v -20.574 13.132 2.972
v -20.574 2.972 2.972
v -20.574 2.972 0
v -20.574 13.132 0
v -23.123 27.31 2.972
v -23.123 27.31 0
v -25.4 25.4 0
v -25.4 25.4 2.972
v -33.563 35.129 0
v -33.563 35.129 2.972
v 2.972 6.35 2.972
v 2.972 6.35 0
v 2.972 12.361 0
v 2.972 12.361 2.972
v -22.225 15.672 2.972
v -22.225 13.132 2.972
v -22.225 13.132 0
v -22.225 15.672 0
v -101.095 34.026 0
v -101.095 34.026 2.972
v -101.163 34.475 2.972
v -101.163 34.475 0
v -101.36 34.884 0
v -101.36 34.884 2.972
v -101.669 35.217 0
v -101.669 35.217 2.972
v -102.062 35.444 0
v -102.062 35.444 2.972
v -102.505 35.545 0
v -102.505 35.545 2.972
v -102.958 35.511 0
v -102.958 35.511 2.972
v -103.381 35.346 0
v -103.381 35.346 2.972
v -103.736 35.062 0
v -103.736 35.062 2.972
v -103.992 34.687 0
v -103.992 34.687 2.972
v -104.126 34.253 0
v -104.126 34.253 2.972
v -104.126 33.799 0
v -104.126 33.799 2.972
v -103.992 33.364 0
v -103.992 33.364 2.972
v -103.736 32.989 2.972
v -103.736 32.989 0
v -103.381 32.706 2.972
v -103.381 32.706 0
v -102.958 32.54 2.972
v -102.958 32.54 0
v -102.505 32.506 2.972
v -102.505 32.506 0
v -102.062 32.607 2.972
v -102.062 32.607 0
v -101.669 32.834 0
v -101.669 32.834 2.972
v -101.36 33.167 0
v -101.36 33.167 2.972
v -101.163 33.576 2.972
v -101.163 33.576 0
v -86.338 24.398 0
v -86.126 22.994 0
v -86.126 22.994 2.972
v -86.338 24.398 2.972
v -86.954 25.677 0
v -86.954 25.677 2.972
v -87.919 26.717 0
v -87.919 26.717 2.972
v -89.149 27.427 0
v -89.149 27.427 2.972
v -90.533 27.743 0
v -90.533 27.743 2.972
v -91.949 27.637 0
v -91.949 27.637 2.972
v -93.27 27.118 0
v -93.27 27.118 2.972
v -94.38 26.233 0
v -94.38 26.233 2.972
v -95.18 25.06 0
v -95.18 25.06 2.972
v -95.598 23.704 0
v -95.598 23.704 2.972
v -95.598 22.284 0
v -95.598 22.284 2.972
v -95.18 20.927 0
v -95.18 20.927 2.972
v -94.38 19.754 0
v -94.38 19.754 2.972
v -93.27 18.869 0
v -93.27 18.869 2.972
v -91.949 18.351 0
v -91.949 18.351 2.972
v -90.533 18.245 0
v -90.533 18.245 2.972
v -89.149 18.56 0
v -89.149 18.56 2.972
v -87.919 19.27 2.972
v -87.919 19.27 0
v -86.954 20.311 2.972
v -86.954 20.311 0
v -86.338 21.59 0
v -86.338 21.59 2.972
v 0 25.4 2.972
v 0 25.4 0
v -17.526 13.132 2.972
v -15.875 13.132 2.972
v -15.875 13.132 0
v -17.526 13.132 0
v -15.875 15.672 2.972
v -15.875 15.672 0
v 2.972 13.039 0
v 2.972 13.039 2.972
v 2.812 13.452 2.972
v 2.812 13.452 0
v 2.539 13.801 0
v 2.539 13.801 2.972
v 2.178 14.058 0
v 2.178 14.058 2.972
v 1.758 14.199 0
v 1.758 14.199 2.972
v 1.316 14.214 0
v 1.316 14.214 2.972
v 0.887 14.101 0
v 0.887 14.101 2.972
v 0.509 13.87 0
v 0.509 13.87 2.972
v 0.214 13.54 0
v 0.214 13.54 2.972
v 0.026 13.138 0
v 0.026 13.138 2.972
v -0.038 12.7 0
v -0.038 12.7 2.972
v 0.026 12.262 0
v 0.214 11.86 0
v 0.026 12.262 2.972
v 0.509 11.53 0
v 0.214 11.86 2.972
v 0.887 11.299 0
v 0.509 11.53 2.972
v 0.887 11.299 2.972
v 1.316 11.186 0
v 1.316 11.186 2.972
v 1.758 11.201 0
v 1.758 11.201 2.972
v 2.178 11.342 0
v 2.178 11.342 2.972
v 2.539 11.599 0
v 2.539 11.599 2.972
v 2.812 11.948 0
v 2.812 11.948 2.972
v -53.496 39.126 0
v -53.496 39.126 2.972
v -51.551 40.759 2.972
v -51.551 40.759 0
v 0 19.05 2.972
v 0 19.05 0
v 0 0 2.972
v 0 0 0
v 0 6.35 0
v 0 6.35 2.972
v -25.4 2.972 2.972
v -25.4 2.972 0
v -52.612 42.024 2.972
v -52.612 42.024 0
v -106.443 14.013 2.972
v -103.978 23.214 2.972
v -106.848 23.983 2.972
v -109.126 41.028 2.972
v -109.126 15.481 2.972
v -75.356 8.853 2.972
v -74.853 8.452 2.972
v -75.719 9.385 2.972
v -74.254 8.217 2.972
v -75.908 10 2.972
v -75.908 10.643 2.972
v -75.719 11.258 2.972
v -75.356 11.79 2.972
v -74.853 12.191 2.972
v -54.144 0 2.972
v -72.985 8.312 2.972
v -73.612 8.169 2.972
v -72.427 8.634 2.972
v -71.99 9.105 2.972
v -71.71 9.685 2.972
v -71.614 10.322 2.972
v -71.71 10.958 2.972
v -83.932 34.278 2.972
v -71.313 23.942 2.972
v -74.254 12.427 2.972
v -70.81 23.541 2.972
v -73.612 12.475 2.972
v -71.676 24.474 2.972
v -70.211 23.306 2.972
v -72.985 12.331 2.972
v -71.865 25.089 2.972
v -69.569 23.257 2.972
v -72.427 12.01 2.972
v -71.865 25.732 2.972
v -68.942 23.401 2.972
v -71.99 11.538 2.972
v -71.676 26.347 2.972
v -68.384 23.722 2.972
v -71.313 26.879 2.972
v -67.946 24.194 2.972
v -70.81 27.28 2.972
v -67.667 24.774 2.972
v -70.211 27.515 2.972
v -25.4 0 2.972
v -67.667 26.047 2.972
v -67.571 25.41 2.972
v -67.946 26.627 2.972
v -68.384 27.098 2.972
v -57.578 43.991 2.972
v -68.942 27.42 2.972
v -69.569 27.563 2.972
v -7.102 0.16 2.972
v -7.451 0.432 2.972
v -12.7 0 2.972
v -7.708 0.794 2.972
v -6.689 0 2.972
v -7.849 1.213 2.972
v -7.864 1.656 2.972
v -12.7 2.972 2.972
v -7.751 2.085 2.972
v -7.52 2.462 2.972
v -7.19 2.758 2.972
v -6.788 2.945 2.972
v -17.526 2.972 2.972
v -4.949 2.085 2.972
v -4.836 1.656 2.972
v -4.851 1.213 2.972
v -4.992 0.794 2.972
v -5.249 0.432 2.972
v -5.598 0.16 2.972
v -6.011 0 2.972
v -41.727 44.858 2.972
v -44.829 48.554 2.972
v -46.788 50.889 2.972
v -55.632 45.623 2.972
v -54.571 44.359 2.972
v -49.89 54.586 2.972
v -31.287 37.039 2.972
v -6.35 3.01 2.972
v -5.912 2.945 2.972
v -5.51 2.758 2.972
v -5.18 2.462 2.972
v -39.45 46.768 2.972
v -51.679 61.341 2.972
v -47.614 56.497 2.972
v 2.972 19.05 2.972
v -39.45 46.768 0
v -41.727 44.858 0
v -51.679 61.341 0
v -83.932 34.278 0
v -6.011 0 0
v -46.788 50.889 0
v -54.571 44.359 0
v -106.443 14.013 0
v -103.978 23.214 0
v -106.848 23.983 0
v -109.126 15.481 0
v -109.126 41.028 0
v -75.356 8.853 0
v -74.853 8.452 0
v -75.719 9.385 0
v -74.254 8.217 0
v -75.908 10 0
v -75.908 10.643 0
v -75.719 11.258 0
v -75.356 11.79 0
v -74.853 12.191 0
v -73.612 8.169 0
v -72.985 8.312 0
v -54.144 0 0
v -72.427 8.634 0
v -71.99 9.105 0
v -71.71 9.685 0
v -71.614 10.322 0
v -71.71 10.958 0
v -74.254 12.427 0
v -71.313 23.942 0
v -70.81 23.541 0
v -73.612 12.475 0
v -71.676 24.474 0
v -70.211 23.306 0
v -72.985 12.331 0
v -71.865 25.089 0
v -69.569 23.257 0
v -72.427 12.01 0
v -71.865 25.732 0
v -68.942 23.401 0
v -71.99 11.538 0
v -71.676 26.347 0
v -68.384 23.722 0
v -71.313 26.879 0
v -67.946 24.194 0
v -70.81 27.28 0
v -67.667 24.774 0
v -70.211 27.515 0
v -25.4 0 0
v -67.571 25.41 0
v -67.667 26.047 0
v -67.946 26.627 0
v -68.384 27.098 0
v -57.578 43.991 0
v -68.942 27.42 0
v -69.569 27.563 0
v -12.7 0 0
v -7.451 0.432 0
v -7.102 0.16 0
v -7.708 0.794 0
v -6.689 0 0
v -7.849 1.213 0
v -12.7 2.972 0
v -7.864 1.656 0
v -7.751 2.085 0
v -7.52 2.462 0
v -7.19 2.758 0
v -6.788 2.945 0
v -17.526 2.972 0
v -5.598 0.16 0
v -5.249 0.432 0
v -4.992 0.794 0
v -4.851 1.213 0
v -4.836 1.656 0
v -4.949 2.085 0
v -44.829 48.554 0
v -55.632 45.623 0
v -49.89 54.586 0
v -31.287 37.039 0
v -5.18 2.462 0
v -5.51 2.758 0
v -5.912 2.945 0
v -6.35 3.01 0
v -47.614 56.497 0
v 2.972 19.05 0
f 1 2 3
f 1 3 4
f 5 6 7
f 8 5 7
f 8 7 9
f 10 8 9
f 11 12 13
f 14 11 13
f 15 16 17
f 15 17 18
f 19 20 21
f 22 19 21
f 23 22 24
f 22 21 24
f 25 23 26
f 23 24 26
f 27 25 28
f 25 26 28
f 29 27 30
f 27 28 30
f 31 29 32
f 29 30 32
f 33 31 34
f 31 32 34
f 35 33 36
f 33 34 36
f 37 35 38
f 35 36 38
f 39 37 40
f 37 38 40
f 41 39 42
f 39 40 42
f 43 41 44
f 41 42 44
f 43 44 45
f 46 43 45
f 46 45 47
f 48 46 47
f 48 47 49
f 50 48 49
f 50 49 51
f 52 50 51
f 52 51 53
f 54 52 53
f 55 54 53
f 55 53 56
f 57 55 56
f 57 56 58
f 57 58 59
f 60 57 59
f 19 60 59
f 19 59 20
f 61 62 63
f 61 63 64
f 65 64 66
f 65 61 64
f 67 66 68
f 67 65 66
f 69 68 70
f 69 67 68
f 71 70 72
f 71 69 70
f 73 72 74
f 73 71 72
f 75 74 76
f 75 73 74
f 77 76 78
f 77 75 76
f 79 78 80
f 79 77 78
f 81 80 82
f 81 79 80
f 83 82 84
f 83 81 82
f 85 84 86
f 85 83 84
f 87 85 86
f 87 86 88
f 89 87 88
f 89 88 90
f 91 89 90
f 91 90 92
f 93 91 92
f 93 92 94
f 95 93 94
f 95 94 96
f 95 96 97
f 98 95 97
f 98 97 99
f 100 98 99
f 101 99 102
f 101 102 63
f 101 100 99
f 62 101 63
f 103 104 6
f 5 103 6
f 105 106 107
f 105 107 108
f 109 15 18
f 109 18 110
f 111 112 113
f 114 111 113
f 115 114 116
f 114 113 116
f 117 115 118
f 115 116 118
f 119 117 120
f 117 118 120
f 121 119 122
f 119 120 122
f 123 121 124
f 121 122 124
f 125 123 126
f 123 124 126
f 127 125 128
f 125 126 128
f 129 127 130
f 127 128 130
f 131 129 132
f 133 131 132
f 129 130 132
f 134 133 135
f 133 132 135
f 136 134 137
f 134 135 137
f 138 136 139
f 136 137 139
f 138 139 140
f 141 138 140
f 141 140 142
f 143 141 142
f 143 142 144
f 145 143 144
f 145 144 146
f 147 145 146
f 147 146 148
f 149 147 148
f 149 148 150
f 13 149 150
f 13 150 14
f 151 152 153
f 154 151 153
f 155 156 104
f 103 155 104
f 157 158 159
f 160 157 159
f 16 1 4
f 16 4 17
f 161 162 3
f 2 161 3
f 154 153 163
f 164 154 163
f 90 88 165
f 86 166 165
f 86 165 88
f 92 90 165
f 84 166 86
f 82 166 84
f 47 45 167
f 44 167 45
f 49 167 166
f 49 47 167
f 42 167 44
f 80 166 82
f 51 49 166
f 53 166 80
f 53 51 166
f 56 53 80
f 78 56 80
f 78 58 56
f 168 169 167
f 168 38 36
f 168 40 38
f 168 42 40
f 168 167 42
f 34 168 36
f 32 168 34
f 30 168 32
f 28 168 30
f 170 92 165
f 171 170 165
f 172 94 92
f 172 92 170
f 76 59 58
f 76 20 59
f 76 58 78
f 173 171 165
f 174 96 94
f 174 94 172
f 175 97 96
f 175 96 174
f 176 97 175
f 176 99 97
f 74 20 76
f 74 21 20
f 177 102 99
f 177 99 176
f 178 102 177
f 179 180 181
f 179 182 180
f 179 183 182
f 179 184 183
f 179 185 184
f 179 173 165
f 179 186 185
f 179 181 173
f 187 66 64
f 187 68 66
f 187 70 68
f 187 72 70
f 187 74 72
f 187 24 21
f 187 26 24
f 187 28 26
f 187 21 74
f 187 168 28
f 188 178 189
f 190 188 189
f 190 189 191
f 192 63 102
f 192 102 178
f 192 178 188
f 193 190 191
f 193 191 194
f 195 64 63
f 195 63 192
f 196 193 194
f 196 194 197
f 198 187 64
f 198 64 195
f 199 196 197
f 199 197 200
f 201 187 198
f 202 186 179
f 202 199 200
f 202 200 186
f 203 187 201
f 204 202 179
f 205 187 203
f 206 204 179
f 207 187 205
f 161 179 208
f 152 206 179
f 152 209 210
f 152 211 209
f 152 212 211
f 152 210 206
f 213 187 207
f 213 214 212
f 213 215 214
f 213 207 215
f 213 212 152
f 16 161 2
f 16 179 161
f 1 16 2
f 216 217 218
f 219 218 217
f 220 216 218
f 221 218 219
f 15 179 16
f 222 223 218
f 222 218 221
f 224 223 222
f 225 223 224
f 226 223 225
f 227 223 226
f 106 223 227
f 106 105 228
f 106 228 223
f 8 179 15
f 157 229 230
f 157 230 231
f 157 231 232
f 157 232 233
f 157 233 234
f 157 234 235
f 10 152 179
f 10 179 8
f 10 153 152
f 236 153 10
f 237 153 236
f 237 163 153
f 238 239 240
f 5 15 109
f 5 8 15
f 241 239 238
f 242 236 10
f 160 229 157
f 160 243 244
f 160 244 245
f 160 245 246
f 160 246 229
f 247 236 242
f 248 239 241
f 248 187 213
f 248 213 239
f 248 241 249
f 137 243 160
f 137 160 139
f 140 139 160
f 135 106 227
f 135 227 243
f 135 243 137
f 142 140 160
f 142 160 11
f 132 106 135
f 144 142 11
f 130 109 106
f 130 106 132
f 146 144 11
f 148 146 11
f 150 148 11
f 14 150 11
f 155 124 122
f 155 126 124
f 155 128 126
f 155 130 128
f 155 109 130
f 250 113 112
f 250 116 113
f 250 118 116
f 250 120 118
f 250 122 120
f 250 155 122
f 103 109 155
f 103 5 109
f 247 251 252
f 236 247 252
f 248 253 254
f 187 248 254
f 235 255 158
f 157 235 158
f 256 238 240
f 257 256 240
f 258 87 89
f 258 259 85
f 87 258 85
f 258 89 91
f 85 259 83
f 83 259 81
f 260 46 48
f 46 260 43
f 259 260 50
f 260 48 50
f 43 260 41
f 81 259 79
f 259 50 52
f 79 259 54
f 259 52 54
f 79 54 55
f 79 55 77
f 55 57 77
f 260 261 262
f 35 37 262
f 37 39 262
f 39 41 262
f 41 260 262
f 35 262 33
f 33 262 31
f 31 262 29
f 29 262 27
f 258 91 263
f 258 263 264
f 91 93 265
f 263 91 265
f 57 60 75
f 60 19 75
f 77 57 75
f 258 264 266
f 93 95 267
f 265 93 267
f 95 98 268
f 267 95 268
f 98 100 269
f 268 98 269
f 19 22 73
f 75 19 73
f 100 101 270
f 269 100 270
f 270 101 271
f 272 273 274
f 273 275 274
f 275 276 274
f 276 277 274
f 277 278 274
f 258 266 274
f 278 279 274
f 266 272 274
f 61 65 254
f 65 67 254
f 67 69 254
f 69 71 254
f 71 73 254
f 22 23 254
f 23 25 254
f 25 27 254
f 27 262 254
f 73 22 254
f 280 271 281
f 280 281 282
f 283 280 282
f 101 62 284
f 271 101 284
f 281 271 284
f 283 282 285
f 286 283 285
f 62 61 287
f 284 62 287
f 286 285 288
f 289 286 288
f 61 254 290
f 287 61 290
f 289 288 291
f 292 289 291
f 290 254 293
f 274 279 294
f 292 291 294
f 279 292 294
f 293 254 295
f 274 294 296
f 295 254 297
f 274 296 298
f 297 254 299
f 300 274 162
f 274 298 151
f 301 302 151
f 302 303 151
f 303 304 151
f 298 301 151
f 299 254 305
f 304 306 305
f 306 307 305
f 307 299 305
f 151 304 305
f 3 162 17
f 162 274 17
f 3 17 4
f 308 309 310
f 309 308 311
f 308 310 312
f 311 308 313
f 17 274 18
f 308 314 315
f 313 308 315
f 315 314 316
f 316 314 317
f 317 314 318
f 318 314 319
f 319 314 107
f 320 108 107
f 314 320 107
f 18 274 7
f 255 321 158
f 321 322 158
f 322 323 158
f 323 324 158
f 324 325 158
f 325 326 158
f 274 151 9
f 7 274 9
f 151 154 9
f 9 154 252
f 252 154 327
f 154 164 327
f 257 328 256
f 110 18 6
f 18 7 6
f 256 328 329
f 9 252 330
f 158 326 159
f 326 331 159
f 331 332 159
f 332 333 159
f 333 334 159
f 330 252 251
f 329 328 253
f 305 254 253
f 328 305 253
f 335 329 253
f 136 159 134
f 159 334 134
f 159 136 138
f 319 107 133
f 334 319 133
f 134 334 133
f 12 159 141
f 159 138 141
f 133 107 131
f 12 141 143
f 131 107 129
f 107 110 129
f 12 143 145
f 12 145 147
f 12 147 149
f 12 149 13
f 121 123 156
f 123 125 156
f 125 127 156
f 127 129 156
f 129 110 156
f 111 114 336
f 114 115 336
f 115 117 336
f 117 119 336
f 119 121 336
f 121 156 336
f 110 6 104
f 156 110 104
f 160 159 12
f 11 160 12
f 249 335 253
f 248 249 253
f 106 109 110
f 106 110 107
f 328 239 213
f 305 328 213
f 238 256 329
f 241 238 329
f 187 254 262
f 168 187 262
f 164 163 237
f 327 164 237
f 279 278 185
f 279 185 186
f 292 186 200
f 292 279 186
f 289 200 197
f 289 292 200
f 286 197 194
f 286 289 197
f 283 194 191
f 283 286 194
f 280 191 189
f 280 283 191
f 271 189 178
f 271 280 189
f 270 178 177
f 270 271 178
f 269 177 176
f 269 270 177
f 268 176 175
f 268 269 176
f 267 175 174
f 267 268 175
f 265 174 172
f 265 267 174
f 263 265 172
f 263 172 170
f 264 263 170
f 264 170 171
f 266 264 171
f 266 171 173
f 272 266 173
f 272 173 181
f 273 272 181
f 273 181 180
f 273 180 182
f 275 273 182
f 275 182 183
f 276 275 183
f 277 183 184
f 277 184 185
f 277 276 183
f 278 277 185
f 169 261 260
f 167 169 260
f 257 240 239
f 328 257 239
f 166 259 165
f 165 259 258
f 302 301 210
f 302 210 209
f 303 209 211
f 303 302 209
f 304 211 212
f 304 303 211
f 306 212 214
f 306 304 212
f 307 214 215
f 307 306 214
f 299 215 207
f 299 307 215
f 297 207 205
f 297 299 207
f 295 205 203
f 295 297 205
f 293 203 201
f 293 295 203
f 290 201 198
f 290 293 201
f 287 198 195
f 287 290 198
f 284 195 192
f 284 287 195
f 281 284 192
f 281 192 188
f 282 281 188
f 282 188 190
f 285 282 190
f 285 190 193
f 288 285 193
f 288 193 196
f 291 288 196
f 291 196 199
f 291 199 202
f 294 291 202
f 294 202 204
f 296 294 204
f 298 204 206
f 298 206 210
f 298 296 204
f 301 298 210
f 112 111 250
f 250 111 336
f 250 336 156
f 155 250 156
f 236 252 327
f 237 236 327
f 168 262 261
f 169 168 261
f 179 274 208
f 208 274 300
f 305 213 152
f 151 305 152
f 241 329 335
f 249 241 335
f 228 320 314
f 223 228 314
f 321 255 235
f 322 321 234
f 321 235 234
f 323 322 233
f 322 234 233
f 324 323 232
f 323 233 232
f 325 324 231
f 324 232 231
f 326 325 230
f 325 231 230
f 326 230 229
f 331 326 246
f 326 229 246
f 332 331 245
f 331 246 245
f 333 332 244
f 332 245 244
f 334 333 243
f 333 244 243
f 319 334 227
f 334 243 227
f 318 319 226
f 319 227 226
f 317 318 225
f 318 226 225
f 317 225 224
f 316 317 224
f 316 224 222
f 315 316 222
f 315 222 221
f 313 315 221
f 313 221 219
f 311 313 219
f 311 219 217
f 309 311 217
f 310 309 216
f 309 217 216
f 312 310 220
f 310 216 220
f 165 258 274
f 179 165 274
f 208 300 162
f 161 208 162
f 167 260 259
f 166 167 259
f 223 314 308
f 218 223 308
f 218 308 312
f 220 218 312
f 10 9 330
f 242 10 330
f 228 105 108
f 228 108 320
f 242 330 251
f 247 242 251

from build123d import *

# Parameters (mm, degrees)
SKETCH1_R           = 2.159
SKETCH1_R_2         = 4.7625
BOSS_EXTRUDE1_DEPTH = 2.9718
SKETCH2_R           = 1.524
CUT_EXTRUDE2_DEPTH  = 3.9718


with BuildPart() as part:
    # Sketch1 → Boss-Extrude1 (new body)
    with BuildSketch(Plane.XY):
        Polygon((-109.126324886, 41.028491651), (-109.126324886, 15.481473491), (-106.848322687, 23.983093437), (-103.977784316, 23.213934999), (-106.443035721, 14.013491503), (-54.143973439, 0), (-25.4, 0), (-25.4, 2.9718), (-12.7, 2.9718), (-12.7, 0), (0, 0), (0, 6.35), (2.9718, 6.35), (2.9718, 19.05), (0, 19.05), (0, 25.4), (-23.123469124, 27.310236218), (-25.4, 25.4), (-33.563402643, 35.128764428), (-31.286871767, 37.039000646), (-39.45027441, 46.767765074), (-41.726805286, 44.857528855), (-49.890207929, 54.586293283), (-47.613677053, 56.496529501), (-51.67877148, 61.341120389), (-83.931779224, 34.277633487), align=None)
        with Locations((-73.773359536, 10.321661037)):
            Circle(SKETCH1_R, mode=Mode.SUBTRACT)
        with Locations((-90.888775854, 22.993747625)):
            Circle(SKETCH1_R_2, mode=Mode.SUBTRACT)
        with Locations((-69.730347232, 25.410388369)):
            Circle(SKETCH1_R, mode=Mode.SUBTRACT)
    extrude(amount=BOSS_EXTRUDE1_DEPTH)

    # Sketch2 → Cut-Extrude2 (cut, through all)
    with BuildSketch(Plane.XY.offset(2.9718)):
        with Locations((1.4859, 12.7)):
            Circle(SKETCH2_R)
        with Locations((-6.35, 1.4859)):
            Circle(SKETCH2_R)
        with Locations((-102.61910191, 34.025683513)):
            Circle(SKETCH2_R)
        Polygon((-22.225, 15.6718), (-15.875, 15.6718), (-15.875, 13.1318), (-17.526, 13.1318), (-17.526, 2.9718), (-20.574, 2.9718), (-20.574, 13.1318), (-22.225, 13.1318), align=None)
        Polygon((-57.578121696, 43.990699533), (-53.496420374, 39.126317319), (-51.550667489, 40.758997848), (-52.611909832, 42.023737223), (-44.82889829, 48.554459338), (-46.788114925, 50.8893628), (-54.571126467, 44.358640686), (-55.63236881, 45.623380062), align=None)
    extrude(amount=-CUT_EXTRUDE2_DEPTH, mode=Mode.SUBTRACT)


solid = part.part
